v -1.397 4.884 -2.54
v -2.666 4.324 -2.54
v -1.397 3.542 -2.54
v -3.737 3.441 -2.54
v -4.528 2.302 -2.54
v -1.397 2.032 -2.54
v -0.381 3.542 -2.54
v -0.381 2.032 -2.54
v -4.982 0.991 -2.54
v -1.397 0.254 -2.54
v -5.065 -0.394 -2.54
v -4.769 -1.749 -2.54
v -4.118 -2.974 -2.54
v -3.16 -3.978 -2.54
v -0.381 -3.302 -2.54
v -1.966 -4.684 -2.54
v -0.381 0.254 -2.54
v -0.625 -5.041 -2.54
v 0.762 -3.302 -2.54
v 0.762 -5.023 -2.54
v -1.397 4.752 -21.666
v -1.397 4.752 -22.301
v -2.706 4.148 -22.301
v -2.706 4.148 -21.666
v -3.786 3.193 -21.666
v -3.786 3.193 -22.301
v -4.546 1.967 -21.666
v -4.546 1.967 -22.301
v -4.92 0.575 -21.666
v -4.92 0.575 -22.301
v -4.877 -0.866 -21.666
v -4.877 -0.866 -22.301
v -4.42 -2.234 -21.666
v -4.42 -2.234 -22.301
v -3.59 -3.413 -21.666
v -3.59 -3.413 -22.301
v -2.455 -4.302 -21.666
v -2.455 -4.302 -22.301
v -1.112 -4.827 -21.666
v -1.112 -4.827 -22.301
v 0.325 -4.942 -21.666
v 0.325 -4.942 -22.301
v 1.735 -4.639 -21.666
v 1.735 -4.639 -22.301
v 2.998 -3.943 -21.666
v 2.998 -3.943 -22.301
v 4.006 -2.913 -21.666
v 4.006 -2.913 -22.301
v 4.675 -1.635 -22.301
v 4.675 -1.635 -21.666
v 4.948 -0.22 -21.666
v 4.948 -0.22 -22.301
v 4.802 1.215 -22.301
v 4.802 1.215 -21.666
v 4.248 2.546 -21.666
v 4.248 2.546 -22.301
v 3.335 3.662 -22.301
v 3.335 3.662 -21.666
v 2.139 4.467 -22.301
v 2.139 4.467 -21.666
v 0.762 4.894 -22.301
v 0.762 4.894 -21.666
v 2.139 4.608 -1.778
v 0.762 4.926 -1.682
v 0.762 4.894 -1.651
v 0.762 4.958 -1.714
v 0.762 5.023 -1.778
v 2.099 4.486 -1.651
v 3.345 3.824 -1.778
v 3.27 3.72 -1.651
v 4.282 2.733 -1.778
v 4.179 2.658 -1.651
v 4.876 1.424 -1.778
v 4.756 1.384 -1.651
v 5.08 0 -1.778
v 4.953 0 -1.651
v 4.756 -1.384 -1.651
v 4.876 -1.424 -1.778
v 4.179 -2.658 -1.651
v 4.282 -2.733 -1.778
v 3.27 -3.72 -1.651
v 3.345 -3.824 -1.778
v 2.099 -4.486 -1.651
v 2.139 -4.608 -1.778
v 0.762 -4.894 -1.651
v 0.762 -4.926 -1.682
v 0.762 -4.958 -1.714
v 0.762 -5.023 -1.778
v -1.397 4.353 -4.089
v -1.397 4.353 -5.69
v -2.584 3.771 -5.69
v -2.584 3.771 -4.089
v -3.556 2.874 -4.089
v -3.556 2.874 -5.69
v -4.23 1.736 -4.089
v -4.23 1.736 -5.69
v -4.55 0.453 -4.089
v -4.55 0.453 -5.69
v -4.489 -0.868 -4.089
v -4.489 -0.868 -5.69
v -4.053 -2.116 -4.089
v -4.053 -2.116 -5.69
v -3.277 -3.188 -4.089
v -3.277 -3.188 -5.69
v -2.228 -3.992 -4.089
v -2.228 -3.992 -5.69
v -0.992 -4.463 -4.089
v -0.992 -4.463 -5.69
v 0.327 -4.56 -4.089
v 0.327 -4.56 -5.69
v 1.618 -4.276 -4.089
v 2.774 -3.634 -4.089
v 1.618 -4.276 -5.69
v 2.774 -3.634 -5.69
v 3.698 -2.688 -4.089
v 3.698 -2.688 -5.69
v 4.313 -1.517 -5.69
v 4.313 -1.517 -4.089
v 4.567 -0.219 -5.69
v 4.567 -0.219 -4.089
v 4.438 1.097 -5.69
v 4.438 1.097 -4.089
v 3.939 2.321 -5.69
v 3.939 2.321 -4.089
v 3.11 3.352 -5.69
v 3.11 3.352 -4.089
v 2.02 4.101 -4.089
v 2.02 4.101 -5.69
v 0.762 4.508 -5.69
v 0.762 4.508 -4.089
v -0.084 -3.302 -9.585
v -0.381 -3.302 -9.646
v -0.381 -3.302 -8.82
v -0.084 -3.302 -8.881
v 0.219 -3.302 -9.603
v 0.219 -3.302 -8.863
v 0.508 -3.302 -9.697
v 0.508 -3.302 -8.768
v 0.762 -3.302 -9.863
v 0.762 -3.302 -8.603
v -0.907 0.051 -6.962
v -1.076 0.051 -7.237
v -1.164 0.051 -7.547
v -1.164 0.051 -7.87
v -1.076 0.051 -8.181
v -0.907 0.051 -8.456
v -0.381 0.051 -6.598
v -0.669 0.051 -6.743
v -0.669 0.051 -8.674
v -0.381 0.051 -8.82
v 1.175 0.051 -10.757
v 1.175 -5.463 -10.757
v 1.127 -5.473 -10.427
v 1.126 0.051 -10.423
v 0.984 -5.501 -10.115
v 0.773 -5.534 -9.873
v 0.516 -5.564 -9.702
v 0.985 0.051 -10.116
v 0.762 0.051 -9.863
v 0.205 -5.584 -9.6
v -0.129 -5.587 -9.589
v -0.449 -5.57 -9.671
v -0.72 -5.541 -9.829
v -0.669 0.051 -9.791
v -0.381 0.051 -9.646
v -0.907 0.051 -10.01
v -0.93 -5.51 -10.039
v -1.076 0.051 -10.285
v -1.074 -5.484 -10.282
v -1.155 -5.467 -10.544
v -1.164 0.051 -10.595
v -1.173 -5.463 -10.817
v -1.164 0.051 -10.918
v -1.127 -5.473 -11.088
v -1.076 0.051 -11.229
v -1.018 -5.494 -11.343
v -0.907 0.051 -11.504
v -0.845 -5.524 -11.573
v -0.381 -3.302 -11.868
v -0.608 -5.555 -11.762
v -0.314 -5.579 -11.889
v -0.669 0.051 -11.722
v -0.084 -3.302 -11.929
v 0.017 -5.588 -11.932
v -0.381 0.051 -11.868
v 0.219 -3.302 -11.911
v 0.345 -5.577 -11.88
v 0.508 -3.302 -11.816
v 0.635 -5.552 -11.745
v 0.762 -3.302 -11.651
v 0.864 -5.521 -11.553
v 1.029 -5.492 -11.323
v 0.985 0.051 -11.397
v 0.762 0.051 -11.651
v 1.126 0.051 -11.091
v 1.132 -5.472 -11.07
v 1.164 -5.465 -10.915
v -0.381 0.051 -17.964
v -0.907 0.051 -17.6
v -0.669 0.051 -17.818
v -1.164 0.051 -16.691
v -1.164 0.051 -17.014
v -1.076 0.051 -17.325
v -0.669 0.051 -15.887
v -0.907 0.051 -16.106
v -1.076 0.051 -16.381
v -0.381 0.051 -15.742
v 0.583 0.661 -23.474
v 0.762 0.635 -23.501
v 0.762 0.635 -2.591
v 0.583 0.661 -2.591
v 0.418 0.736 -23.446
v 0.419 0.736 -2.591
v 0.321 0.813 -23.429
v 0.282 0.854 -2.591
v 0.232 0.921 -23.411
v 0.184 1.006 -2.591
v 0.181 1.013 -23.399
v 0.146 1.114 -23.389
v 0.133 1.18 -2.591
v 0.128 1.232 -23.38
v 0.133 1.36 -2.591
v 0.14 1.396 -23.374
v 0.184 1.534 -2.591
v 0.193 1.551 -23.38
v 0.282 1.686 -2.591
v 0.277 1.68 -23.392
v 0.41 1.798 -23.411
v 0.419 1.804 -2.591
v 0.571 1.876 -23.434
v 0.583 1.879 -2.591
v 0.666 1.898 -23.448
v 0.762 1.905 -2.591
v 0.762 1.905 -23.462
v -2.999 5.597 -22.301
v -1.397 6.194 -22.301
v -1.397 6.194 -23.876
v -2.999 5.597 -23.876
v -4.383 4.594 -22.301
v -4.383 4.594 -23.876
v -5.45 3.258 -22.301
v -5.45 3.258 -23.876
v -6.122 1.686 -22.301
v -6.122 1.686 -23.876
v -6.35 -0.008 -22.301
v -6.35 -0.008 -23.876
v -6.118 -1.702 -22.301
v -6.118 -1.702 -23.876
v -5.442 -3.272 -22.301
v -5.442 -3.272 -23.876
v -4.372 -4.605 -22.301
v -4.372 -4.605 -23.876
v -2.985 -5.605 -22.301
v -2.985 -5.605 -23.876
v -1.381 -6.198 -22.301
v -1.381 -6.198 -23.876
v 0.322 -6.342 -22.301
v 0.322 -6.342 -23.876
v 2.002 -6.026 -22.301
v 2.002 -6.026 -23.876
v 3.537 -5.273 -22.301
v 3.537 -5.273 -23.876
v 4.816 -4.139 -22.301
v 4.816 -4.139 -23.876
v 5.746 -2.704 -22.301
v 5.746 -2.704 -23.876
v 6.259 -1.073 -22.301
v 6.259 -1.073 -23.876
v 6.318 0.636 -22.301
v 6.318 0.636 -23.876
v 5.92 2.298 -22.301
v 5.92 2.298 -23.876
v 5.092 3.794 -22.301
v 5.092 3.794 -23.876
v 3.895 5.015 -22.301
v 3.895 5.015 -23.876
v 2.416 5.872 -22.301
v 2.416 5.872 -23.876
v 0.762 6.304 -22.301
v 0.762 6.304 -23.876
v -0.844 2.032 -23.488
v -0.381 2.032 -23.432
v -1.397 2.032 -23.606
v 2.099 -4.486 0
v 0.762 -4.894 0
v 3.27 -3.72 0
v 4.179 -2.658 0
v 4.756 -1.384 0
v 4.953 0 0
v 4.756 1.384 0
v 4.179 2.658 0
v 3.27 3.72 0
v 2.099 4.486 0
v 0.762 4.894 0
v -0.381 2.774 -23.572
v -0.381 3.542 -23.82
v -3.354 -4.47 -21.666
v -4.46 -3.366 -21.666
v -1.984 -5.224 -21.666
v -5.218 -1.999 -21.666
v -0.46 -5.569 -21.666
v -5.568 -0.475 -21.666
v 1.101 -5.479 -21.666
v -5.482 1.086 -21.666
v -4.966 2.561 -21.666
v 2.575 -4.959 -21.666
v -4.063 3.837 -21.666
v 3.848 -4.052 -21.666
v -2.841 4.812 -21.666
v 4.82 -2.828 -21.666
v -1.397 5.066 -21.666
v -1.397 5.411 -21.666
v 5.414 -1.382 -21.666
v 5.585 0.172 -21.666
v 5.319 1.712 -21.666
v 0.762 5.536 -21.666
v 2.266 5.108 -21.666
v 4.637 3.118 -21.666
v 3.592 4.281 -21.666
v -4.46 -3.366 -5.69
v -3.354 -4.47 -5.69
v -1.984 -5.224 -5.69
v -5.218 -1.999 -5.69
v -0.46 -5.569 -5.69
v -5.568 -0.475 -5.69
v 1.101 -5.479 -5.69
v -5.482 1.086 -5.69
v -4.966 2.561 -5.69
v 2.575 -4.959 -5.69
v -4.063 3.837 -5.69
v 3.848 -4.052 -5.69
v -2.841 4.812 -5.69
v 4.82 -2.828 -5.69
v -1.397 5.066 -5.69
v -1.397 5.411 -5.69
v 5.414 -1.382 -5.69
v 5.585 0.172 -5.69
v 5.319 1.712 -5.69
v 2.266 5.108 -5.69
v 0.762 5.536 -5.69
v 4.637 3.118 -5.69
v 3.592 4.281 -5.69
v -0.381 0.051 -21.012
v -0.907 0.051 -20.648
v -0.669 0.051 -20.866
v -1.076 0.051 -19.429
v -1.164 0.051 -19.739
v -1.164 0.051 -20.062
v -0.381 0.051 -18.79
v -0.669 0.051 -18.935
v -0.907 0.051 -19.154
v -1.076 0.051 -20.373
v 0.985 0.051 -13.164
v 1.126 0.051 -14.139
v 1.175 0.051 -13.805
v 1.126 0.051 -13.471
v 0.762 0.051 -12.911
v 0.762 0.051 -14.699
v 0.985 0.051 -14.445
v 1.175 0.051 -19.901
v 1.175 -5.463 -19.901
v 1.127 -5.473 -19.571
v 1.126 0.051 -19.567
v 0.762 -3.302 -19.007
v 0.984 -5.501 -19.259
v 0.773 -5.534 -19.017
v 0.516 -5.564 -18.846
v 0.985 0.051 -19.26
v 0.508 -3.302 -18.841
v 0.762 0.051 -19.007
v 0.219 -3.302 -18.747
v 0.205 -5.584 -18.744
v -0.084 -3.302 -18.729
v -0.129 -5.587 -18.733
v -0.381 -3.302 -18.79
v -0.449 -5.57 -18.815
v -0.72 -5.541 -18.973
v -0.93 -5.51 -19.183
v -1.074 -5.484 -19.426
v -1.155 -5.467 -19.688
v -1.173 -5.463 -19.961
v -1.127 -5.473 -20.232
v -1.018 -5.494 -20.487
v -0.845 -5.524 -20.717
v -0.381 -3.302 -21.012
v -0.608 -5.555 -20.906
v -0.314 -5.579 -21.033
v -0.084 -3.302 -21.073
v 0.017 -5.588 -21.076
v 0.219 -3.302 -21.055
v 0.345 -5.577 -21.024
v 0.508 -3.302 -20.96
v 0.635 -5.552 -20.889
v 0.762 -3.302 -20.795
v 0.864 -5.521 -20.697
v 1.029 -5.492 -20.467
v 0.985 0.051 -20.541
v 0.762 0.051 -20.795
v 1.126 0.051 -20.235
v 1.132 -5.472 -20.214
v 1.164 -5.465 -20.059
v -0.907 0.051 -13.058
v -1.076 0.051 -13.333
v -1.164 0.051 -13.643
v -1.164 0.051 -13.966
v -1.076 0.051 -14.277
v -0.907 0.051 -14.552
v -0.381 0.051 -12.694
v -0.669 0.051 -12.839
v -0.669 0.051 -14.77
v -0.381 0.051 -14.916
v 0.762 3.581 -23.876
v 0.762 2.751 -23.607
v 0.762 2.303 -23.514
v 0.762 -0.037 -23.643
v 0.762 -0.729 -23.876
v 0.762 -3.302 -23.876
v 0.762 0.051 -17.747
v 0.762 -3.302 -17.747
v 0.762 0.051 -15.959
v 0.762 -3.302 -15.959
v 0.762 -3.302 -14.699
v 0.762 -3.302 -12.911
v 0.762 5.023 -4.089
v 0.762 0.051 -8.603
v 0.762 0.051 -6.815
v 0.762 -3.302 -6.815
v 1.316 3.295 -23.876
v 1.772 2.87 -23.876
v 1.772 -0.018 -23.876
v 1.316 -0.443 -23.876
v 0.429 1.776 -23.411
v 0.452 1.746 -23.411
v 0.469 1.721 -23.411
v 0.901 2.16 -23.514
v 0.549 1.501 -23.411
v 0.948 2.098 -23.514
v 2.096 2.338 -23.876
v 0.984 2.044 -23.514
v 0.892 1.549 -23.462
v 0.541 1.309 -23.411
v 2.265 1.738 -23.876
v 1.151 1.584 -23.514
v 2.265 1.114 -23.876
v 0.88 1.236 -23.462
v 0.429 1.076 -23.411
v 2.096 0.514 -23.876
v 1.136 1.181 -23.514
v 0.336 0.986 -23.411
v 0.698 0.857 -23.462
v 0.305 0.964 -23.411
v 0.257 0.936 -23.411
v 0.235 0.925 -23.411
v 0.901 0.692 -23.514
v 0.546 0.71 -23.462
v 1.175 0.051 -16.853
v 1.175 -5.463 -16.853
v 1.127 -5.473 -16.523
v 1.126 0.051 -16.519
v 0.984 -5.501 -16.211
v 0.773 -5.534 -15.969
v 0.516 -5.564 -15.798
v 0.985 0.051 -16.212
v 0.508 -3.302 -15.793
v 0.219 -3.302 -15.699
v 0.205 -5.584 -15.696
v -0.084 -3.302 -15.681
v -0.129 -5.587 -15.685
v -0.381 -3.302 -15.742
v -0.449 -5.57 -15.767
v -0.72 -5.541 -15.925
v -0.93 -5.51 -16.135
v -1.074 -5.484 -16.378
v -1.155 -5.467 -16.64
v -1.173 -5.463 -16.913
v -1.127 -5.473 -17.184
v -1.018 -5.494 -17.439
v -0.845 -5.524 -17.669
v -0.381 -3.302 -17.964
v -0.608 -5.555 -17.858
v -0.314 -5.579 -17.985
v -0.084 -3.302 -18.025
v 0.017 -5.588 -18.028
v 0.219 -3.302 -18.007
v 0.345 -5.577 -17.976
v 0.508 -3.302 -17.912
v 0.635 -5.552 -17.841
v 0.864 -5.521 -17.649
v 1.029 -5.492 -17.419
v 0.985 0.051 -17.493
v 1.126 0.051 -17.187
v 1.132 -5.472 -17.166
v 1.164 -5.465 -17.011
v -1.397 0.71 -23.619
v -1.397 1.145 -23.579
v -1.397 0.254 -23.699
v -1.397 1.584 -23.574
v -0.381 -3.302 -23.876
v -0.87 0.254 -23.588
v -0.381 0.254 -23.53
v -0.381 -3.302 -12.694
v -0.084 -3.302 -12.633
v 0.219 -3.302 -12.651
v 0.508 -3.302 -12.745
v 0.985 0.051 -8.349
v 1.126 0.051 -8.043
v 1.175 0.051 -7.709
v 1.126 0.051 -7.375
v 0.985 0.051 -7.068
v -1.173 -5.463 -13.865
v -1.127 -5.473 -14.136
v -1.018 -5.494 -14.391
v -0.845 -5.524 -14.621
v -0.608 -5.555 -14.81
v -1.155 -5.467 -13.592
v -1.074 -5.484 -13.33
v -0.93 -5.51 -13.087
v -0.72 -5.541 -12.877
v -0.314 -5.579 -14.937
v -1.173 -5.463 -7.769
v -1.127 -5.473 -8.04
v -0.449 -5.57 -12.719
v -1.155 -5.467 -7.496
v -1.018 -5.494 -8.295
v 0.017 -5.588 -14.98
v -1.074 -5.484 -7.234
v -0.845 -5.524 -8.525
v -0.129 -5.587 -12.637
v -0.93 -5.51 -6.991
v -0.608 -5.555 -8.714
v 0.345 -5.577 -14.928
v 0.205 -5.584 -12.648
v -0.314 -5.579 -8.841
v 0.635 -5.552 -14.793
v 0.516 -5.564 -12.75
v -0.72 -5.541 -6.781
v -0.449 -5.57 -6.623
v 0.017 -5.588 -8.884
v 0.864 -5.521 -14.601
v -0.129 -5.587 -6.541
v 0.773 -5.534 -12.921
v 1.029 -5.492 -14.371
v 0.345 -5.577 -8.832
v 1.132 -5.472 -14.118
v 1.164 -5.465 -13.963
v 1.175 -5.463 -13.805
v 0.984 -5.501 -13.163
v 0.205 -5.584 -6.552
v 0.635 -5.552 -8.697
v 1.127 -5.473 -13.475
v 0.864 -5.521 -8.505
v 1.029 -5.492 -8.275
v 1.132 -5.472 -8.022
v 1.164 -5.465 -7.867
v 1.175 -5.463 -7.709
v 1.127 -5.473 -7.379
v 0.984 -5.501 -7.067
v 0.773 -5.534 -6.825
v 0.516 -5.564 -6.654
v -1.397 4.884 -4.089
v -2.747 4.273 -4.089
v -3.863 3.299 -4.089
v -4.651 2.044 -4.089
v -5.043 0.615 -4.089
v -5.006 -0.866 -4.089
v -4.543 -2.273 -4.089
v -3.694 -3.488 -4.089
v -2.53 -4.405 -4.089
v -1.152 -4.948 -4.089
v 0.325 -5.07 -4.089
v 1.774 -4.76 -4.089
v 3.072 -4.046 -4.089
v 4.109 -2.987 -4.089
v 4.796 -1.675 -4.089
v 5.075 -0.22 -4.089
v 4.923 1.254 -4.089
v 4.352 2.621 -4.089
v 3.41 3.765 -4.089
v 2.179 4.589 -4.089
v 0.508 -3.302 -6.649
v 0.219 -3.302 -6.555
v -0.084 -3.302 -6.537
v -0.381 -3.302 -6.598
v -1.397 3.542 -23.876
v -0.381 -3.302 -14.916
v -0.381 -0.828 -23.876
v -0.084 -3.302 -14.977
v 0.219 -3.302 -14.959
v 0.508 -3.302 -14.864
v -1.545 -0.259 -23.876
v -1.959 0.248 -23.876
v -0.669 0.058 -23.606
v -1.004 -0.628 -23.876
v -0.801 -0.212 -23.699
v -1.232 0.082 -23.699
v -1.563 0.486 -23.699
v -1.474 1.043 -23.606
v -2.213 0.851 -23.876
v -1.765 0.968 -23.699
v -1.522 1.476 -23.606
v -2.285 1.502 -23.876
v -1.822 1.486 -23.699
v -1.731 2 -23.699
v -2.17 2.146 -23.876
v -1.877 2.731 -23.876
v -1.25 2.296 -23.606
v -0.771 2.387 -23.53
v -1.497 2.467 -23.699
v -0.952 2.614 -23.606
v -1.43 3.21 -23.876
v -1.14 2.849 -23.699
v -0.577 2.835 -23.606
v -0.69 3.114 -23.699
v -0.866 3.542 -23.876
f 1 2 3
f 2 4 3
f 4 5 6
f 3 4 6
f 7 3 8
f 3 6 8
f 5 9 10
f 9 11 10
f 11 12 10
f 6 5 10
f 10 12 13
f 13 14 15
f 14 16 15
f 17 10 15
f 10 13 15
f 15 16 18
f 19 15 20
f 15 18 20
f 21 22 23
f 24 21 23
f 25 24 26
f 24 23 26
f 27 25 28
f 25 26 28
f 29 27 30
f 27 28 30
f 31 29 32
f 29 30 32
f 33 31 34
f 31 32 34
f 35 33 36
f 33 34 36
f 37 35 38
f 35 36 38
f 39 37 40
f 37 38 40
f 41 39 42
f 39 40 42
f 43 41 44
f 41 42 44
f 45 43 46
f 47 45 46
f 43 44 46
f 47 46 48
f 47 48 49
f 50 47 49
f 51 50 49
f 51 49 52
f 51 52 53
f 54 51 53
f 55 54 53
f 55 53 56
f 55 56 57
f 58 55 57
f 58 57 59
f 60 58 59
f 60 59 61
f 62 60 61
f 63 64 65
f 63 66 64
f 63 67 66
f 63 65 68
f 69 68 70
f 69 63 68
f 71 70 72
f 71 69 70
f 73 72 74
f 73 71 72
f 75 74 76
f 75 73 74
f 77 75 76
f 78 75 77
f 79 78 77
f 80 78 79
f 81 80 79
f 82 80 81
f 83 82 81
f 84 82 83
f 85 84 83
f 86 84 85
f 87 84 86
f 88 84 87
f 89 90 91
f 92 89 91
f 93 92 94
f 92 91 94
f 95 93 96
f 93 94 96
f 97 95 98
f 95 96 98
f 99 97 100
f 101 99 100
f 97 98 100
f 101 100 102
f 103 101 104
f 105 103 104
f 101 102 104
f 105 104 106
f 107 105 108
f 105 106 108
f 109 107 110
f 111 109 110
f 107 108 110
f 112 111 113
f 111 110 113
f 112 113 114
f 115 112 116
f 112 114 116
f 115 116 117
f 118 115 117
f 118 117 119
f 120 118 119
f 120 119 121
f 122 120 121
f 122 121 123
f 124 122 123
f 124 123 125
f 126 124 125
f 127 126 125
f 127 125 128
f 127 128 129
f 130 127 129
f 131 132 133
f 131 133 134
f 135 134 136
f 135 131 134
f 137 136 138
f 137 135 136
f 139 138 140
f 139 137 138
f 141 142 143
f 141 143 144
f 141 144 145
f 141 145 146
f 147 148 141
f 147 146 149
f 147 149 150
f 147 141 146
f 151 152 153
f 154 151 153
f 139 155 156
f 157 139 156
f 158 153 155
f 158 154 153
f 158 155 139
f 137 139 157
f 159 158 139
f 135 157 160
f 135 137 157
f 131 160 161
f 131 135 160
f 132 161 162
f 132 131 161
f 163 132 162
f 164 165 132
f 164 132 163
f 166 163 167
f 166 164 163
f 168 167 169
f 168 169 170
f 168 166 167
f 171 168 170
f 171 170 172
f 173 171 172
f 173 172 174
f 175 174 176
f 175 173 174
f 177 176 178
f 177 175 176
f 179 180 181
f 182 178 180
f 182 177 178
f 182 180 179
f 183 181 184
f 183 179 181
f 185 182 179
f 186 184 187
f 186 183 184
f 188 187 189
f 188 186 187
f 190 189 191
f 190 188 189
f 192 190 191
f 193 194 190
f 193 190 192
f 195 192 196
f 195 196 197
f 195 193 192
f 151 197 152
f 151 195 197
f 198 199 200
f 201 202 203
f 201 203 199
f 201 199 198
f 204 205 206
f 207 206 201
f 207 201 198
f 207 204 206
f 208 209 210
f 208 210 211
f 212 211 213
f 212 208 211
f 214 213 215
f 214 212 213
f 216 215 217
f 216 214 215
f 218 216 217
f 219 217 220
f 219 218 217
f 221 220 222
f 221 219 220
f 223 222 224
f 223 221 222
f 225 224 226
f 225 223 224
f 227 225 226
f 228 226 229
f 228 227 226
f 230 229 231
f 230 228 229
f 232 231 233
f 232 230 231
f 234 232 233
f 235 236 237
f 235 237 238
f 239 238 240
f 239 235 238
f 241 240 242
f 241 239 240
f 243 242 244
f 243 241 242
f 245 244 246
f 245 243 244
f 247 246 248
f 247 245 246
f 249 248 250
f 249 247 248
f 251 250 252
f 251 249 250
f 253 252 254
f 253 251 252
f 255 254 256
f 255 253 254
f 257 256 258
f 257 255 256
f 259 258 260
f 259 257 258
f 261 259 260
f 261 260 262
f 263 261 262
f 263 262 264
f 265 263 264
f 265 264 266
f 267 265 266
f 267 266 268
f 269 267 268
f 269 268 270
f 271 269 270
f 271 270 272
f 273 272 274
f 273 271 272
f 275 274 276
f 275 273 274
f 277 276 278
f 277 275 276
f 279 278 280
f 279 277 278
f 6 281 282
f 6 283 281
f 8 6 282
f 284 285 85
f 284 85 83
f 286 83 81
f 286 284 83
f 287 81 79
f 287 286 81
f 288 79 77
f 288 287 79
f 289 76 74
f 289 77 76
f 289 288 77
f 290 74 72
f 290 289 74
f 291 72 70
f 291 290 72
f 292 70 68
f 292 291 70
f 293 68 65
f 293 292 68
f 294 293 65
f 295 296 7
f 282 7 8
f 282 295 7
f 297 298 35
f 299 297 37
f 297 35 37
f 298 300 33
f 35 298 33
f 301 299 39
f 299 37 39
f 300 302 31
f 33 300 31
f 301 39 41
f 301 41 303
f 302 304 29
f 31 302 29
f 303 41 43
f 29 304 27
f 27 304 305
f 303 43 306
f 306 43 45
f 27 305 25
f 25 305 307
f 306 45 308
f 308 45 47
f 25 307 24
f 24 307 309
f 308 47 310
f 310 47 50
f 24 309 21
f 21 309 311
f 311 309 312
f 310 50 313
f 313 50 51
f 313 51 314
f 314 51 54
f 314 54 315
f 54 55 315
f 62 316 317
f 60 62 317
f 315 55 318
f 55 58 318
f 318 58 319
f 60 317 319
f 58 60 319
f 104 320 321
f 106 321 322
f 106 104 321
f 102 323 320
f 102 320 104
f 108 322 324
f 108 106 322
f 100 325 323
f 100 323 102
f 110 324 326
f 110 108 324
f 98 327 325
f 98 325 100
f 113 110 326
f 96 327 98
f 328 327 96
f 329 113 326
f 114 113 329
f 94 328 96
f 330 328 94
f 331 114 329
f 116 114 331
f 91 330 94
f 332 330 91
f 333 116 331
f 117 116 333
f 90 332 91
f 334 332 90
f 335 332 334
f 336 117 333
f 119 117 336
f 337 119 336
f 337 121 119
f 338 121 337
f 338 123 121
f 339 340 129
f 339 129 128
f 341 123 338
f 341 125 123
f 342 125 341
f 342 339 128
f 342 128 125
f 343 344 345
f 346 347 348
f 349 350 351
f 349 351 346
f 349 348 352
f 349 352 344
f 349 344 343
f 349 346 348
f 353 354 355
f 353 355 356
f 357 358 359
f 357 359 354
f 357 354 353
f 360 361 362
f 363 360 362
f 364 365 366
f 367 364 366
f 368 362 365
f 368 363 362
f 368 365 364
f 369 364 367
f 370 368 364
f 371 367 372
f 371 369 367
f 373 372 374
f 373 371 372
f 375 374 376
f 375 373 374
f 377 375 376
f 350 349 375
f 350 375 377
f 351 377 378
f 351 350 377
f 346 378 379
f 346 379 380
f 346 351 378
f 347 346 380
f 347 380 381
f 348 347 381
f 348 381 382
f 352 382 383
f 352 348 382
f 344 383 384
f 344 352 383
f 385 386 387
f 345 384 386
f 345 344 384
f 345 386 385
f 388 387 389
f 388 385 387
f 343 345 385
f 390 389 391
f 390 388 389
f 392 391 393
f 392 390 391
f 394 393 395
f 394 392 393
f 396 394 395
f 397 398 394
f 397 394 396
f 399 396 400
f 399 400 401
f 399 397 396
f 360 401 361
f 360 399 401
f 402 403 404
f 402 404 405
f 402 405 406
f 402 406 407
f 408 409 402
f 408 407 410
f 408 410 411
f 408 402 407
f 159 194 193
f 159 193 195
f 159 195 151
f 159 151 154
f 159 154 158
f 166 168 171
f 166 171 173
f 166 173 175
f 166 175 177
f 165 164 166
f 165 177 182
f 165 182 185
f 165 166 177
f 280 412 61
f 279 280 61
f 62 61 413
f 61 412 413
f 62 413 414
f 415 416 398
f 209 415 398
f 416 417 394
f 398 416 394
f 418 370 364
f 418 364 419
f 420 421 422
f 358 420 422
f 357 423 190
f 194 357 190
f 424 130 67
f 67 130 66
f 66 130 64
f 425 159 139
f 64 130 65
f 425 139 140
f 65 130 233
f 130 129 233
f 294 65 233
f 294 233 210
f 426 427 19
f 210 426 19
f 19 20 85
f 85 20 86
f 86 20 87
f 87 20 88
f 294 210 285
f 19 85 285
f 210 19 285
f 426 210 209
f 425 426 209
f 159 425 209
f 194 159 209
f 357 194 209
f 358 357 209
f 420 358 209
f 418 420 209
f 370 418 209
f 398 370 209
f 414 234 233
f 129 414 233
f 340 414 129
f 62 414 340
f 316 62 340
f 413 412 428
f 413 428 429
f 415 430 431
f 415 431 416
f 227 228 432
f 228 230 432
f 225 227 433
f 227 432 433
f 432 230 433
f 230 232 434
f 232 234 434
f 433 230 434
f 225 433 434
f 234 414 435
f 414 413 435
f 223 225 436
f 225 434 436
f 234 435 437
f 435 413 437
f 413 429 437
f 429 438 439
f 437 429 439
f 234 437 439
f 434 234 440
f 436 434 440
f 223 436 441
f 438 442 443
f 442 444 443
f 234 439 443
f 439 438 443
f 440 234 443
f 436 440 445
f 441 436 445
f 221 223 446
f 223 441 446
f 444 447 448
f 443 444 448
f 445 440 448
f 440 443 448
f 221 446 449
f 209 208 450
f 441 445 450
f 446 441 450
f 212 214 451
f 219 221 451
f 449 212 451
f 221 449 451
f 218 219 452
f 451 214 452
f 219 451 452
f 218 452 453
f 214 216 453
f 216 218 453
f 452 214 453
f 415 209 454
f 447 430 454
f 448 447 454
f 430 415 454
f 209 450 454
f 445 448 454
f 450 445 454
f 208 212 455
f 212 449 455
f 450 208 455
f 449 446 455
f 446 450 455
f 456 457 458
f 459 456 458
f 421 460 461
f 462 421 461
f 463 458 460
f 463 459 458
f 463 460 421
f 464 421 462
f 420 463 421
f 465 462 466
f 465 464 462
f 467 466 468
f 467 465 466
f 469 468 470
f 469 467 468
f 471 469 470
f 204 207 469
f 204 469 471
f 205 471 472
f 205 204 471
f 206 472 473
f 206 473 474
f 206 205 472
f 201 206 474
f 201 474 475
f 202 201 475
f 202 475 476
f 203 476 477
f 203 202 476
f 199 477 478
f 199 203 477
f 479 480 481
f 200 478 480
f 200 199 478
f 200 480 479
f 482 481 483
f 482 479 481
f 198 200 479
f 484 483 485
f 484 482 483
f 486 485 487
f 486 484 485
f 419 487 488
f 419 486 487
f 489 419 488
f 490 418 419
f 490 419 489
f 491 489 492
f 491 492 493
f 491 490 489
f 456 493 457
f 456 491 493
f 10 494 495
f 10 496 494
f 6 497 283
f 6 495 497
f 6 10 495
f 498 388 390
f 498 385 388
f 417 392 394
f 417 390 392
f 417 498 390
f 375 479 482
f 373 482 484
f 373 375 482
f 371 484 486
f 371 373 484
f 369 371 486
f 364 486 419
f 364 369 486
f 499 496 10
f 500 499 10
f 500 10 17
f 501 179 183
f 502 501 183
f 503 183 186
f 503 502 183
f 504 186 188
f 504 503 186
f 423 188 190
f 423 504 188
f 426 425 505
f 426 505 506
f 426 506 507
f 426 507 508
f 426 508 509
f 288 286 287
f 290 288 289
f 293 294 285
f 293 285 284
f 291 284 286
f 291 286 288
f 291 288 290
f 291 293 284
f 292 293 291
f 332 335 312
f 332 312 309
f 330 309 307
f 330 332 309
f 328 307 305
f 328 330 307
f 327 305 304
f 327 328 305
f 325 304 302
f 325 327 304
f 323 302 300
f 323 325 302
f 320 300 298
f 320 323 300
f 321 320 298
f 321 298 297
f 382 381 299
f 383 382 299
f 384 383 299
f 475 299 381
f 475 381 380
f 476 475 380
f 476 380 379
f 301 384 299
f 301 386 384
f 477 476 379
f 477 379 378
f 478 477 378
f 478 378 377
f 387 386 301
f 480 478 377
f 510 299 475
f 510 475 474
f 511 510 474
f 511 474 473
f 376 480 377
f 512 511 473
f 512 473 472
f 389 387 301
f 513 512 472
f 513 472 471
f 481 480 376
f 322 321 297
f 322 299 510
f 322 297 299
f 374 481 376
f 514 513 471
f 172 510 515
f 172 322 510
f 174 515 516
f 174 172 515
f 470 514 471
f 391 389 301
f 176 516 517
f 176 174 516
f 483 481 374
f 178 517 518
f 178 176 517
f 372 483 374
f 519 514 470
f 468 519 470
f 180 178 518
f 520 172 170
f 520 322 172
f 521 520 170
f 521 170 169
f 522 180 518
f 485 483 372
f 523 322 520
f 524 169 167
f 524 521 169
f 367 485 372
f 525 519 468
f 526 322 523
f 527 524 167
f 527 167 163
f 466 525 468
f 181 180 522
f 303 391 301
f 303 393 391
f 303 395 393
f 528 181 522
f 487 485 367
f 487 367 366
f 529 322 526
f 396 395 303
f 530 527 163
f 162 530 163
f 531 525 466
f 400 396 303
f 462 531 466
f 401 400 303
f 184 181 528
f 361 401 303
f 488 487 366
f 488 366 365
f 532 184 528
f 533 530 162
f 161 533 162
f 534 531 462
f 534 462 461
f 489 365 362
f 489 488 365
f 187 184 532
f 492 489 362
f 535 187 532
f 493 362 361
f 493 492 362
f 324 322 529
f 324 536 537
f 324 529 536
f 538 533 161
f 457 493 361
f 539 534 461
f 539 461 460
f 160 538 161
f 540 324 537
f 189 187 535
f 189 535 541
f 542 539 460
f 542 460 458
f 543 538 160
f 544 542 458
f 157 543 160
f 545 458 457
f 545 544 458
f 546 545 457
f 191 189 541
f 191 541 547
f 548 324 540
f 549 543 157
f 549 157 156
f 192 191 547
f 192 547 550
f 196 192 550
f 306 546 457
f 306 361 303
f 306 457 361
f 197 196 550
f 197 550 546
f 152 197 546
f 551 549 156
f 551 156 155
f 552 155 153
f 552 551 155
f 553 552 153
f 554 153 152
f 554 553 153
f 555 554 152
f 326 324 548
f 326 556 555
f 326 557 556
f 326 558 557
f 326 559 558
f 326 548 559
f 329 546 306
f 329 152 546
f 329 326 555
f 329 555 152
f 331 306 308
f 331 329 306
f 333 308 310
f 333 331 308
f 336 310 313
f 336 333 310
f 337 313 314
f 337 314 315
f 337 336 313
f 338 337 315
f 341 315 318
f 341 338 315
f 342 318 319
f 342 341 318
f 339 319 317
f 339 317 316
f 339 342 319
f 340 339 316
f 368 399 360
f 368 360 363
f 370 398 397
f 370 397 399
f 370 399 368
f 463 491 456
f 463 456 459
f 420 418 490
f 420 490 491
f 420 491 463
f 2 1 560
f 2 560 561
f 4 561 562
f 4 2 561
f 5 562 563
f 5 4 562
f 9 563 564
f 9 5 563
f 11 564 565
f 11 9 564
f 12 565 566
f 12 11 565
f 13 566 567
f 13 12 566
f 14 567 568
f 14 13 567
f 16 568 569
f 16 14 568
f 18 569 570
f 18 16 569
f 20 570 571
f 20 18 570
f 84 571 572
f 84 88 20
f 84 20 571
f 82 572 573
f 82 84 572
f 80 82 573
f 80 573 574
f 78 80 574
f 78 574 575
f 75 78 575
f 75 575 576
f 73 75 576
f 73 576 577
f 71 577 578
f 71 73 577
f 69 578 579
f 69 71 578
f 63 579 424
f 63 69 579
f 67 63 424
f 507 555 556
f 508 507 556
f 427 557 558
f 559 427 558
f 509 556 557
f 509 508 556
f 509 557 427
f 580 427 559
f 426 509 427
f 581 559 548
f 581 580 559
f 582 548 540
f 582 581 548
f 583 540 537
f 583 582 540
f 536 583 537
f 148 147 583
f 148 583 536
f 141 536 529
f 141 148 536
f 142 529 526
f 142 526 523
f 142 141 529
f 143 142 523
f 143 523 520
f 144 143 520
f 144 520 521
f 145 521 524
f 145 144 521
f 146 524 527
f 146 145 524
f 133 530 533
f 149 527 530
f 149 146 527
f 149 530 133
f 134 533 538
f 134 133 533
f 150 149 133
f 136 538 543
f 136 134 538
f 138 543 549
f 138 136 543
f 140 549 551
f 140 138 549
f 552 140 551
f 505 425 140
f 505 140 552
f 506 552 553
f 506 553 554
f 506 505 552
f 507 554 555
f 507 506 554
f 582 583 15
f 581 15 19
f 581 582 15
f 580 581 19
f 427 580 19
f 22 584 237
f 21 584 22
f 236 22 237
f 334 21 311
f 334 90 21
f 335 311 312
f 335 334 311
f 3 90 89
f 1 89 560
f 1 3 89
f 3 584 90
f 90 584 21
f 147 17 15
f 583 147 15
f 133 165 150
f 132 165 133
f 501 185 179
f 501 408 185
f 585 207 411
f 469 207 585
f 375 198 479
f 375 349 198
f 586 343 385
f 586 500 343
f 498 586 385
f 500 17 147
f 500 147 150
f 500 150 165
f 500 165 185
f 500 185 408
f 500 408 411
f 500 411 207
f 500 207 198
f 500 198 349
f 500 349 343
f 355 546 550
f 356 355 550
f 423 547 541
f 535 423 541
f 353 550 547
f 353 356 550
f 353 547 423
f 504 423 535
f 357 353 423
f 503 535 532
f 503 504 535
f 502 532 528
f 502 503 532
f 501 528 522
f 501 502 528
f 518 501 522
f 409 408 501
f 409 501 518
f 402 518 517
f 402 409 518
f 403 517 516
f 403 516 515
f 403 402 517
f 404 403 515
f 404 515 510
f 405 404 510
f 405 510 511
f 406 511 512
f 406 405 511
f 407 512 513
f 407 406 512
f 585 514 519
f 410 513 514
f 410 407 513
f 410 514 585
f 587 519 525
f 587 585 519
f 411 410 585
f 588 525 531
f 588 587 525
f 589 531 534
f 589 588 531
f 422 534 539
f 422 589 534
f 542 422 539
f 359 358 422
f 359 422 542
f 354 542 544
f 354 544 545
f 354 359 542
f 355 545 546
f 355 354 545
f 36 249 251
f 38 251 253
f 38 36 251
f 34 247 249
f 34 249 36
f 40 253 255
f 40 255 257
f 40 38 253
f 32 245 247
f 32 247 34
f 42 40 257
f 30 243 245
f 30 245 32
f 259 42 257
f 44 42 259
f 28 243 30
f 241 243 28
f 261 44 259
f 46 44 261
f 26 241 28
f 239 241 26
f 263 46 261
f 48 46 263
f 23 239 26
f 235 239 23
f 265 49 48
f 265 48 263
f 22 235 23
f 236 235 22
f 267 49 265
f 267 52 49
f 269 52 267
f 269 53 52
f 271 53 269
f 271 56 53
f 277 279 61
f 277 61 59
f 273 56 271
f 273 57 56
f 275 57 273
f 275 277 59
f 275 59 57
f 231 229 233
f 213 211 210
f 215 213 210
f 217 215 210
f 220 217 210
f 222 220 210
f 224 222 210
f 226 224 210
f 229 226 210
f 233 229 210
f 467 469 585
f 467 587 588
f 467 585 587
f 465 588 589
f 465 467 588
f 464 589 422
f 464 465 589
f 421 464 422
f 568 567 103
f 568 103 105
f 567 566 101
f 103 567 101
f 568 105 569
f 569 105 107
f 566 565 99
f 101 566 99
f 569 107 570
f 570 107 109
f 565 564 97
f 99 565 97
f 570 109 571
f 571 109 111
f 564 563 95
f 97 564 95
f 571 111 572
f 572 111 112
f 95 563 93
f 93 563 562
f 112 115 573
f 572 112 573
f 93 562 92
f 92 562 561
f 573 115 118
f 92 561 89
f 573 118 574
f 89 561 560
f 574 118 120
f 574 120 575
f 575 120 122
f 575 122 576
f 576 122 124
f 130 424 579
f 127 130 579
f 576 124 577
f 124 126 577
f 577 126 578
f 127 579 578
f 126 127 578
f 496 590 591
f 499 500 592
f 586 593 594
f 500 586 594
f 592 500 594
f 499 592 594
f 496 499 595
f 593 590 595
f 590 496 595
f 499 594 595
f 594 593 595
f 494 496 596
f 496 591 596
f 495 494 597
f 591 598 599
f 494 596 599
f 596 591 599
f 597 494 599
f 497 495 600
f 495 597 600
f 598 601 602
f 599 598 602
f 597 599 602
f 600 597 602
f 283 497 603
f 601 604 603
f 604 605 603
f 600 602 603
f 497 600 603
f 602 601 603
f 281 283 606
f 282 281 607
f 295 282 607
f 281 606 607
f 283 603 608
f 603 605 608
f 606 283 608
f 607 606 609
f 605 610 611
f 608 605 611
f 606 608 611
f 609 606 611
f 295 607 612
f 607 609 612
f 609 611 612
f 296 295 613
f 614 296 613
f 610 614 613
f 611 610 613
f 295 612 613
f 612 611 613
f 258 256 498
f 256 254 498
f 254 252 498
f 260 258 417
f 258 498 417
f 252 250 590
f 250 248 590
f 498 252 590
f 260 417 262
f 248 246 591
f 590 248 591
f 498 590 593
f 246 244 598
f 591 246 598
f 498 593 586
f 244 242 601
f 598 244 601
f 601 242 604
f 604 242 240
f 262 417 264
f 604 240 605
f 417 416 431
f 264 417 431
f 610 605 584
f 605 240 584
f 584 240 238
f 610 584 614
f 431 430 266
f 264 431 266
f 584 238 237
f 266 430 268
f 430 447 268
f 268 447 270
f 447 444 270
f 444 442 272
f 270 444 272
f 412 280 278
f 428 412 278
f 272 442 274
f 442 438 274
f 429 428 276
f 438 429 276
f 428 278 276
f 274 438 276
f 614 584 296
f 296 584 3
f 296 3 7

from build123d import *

# Parameters (mm, degrees)
F0_R          = 6.35
F1_DEPTH      = 23.876
F2_R          = 6.35
F2_R_2        = 5.588
F3_DEPTH      = 22.3012
F4_R          = 5.842
F4_R_2        = 4.953
F5_DEPTH      = 0.635
F6_R          = 1.17475
F7_DEPTH      = 5.7404
F7_DEPTH_BACK = 0.0508
F8_R          = 5.715
F8_R_2        = 4.572
F9_DEPTH      = 5.6896
F10_R         = 5.08
F10_R_2       = 4.572
F11_DEPTH     = 4.0894
F12_W         = 7.8048733994
F12_H         = 4.4421355706
F13_DEPTH     = 5.6896
F14_R         = 5.08
F14_R_2       = 4.953
F15_DEPTH     = 1.778
F16_SIZE      = 0.12699
F17_W         = 1.143
F17_H         = 9.652
F18_DEPTH     = 23.877
F19_W         = 1.016
F19_H         = 1.524
F20_DEPTH     = 21.9456
F21_W         = 1.016
F21_H         = 1.5748
F22_DEPTH     = 1.9304
F23_W         = 1.016
F23_H         = 1.778
F24_DEPTH     = 21.336
F25_R         = 0.635
F26_DEPTH     = 21.2852
F29_W         = 1.1630140017
F29_H         = 0.8712620474
F30_DEPTH     = 25.4


# Not quite as in the source:
# - a fillet or chamfer is up to 0.001 mm smaller than in the source, because OpenCascade refuses the exact size


with BuildPart() as f1:
    # F0 (on Top) → F1 (new body)
    with BuildSketch(Plane.XY):
        Circle(F0_R)
    extrude(amount=-F1_DEPTH)

    # F2 (on Top) → F3 (cut)
    with BuildSketch(Plane.XY):
        Circle(F2_R)
        Circle(F2_R_2, mode=Mode.SUBTRACT)
    extrude(amount=-F3_DEPTH, mode=Mode.SUBTRACT)

    # F4 (on face) → F5 (cut)
    with BuildSketch(Plane.XY.offset(-22.3012)):
        Circle(F4_R)
        Circle(F4_R_2, mode=Mode.SUBTRACT)
    extrude(amount=F5_DEPTH, mode=Mode.SUBTRACT)

    # F6 (on Front) → F7 (cut, two sides)
    with BuildSketch(Plane.XZ) as f7_sk:
        with Locations((0, -19.9009)):
            Circle(F6_R)
        with Locations((0, -16.8529)):
            Circle(F6_R)
        with Locations((0, -13.8049)):
            Circle(F6_R)
        with Locations((0, -10.7569)):
            Circle(F6_R)
        with Locations((0, -7.7089)):
            Circle(F6_R)
    extrude(amount=F7_DEPTH, mode=Mode.SUBTRACT)
    extrude(f7_sk.sketch, amount=-F7_DEPTH_BACK, mode=Mode.SUBTRACT)

    # F8 (on face) → F9 (cut, symmetric)
    with BuildSketch(Plane.XY):
        Circle(F8_R)
        Circle(F8_R_2, mode=Mode.SUBTRACT)
    extrude(amount=F9_DEPTH, both=True, mode=Mode.SUBTRACT)

    # F10 (on face) → F11 (join)
    with BuildSketch(Plane.XY):
        Circle(F10_R)
        Circle(F10_R_2, mode=Mode.SUBTRACT)
    extrude(amount=-F11_DEPTH)

    # F12 (on Front) → F13 (cut, symmetric)
    with BuildSketch(Plane.XZ):
        with Locations((-3.1404366997, -0.3189322147)):
            Rectangle(F12_W, F12_H)
    extrude(amount=F13_DEPTH, both=True, mode=Mode.SUBTRACT)

    # F14 (on face) → F15 (cut)
    with BuildSketch(Plane.XY):
        Circle(F14_R)
        Circle(F14_R_2, mode=Mode.SUBTRACT)
    extrude(amount=-F15_DEPTH, mode=Mode.SUBTRACT)

    # F16 (size 0.127 in the source; OpenCascade refuses exactly that, so slightly less here)
    f16_edges = [f1.edges().sort_by_distance(p)[0] for p in [
        (4.953, 0, -1.778),
    ]]
    chamfer(f16_edges, length=F16_SIZE)

    # F17 (on face) → F18 (cut, through all)
    with BuildSketch(Plane(origin=(0, 0, -23.876), x_dir=(1, 0, 0), z_dir=(0, 0, -1))):
        with Locations((0.1905, -1.524)):
            Rectangle(F17_W, F17_H)
    extrude(amount=-F18_DEPTH, mode=Mode.SUBTRACT)

    # F19 (on face) → F20 (cut)
    with BuildSketch(Plane.XY.offset(-2.54)):
        with Locations((-0.889, 4.3036923515)):
            Rectangle(F19_W, F19_H)
    extrude(amount=-F20_DEPTH, mode=Mode.SUBTRACT)

    # F21 (on face) → F22 (cut)
    with BuildSketch(Plane.XZ.offset(-5.0656923515)):
        with Locations((-0.889, -23.0886)):
            Rectangle(F21_W, F21_H)
    extrude(amount=-F22_DEPTH, mode=Mode.SUBTRACT)

    # F23 (on face) → F24 (cut, through all)
    with BuildSketch(Plane.XY.offset(-2.54)):
        with Locations((-0.889, 1.143)):
            Rectangle(F23_W, F23_H)
    extrude(amount=-F24_DEPTH, mode=Mode.SUBTRACT)

    # F25 (on face) → F26 (join)
    with BuildSketch(Plane(origin=(0, 0, -23.876), x_dir=(1, 0, 0), z_dir=(0, 0, -1))):
        with Locations((0.762, -1.27)):
            Circle(F25_R)
    extrude(amount=-F26_DEPTH)

    # F27 (on Right) → F28 (revolve, cut)
    with BuildSketch(Plane.YZ):
        with BuildLine():
            Line((1.4259085423, -23.876), (1.4259085423, -23.368))
            ThreePointArc((1.4259085423, -23.368), (0.2592411198, -23.5154965988), (-0.8600914577, -23.876))
            Line((-0.8600914577, -23.876), (1.4259085423, -23.876))
        make_face()
    revolve(axis=Axis((0, 1.4259085423, -23.622), (0, 0, -1)), mode=Mode.SUBTRACT)

    # F29 (on face) → F30 (cut)
    with BuildSketch(Plane.XY.offset(-5.6896)):
        with Locations((-0.8154929991, 5.274676485)):
            Rectangle(F29_W, F29_H)
    extrude(amount=-F30_DEPTH, mode=Mode.SUBTRACT)


solid = f1.part
